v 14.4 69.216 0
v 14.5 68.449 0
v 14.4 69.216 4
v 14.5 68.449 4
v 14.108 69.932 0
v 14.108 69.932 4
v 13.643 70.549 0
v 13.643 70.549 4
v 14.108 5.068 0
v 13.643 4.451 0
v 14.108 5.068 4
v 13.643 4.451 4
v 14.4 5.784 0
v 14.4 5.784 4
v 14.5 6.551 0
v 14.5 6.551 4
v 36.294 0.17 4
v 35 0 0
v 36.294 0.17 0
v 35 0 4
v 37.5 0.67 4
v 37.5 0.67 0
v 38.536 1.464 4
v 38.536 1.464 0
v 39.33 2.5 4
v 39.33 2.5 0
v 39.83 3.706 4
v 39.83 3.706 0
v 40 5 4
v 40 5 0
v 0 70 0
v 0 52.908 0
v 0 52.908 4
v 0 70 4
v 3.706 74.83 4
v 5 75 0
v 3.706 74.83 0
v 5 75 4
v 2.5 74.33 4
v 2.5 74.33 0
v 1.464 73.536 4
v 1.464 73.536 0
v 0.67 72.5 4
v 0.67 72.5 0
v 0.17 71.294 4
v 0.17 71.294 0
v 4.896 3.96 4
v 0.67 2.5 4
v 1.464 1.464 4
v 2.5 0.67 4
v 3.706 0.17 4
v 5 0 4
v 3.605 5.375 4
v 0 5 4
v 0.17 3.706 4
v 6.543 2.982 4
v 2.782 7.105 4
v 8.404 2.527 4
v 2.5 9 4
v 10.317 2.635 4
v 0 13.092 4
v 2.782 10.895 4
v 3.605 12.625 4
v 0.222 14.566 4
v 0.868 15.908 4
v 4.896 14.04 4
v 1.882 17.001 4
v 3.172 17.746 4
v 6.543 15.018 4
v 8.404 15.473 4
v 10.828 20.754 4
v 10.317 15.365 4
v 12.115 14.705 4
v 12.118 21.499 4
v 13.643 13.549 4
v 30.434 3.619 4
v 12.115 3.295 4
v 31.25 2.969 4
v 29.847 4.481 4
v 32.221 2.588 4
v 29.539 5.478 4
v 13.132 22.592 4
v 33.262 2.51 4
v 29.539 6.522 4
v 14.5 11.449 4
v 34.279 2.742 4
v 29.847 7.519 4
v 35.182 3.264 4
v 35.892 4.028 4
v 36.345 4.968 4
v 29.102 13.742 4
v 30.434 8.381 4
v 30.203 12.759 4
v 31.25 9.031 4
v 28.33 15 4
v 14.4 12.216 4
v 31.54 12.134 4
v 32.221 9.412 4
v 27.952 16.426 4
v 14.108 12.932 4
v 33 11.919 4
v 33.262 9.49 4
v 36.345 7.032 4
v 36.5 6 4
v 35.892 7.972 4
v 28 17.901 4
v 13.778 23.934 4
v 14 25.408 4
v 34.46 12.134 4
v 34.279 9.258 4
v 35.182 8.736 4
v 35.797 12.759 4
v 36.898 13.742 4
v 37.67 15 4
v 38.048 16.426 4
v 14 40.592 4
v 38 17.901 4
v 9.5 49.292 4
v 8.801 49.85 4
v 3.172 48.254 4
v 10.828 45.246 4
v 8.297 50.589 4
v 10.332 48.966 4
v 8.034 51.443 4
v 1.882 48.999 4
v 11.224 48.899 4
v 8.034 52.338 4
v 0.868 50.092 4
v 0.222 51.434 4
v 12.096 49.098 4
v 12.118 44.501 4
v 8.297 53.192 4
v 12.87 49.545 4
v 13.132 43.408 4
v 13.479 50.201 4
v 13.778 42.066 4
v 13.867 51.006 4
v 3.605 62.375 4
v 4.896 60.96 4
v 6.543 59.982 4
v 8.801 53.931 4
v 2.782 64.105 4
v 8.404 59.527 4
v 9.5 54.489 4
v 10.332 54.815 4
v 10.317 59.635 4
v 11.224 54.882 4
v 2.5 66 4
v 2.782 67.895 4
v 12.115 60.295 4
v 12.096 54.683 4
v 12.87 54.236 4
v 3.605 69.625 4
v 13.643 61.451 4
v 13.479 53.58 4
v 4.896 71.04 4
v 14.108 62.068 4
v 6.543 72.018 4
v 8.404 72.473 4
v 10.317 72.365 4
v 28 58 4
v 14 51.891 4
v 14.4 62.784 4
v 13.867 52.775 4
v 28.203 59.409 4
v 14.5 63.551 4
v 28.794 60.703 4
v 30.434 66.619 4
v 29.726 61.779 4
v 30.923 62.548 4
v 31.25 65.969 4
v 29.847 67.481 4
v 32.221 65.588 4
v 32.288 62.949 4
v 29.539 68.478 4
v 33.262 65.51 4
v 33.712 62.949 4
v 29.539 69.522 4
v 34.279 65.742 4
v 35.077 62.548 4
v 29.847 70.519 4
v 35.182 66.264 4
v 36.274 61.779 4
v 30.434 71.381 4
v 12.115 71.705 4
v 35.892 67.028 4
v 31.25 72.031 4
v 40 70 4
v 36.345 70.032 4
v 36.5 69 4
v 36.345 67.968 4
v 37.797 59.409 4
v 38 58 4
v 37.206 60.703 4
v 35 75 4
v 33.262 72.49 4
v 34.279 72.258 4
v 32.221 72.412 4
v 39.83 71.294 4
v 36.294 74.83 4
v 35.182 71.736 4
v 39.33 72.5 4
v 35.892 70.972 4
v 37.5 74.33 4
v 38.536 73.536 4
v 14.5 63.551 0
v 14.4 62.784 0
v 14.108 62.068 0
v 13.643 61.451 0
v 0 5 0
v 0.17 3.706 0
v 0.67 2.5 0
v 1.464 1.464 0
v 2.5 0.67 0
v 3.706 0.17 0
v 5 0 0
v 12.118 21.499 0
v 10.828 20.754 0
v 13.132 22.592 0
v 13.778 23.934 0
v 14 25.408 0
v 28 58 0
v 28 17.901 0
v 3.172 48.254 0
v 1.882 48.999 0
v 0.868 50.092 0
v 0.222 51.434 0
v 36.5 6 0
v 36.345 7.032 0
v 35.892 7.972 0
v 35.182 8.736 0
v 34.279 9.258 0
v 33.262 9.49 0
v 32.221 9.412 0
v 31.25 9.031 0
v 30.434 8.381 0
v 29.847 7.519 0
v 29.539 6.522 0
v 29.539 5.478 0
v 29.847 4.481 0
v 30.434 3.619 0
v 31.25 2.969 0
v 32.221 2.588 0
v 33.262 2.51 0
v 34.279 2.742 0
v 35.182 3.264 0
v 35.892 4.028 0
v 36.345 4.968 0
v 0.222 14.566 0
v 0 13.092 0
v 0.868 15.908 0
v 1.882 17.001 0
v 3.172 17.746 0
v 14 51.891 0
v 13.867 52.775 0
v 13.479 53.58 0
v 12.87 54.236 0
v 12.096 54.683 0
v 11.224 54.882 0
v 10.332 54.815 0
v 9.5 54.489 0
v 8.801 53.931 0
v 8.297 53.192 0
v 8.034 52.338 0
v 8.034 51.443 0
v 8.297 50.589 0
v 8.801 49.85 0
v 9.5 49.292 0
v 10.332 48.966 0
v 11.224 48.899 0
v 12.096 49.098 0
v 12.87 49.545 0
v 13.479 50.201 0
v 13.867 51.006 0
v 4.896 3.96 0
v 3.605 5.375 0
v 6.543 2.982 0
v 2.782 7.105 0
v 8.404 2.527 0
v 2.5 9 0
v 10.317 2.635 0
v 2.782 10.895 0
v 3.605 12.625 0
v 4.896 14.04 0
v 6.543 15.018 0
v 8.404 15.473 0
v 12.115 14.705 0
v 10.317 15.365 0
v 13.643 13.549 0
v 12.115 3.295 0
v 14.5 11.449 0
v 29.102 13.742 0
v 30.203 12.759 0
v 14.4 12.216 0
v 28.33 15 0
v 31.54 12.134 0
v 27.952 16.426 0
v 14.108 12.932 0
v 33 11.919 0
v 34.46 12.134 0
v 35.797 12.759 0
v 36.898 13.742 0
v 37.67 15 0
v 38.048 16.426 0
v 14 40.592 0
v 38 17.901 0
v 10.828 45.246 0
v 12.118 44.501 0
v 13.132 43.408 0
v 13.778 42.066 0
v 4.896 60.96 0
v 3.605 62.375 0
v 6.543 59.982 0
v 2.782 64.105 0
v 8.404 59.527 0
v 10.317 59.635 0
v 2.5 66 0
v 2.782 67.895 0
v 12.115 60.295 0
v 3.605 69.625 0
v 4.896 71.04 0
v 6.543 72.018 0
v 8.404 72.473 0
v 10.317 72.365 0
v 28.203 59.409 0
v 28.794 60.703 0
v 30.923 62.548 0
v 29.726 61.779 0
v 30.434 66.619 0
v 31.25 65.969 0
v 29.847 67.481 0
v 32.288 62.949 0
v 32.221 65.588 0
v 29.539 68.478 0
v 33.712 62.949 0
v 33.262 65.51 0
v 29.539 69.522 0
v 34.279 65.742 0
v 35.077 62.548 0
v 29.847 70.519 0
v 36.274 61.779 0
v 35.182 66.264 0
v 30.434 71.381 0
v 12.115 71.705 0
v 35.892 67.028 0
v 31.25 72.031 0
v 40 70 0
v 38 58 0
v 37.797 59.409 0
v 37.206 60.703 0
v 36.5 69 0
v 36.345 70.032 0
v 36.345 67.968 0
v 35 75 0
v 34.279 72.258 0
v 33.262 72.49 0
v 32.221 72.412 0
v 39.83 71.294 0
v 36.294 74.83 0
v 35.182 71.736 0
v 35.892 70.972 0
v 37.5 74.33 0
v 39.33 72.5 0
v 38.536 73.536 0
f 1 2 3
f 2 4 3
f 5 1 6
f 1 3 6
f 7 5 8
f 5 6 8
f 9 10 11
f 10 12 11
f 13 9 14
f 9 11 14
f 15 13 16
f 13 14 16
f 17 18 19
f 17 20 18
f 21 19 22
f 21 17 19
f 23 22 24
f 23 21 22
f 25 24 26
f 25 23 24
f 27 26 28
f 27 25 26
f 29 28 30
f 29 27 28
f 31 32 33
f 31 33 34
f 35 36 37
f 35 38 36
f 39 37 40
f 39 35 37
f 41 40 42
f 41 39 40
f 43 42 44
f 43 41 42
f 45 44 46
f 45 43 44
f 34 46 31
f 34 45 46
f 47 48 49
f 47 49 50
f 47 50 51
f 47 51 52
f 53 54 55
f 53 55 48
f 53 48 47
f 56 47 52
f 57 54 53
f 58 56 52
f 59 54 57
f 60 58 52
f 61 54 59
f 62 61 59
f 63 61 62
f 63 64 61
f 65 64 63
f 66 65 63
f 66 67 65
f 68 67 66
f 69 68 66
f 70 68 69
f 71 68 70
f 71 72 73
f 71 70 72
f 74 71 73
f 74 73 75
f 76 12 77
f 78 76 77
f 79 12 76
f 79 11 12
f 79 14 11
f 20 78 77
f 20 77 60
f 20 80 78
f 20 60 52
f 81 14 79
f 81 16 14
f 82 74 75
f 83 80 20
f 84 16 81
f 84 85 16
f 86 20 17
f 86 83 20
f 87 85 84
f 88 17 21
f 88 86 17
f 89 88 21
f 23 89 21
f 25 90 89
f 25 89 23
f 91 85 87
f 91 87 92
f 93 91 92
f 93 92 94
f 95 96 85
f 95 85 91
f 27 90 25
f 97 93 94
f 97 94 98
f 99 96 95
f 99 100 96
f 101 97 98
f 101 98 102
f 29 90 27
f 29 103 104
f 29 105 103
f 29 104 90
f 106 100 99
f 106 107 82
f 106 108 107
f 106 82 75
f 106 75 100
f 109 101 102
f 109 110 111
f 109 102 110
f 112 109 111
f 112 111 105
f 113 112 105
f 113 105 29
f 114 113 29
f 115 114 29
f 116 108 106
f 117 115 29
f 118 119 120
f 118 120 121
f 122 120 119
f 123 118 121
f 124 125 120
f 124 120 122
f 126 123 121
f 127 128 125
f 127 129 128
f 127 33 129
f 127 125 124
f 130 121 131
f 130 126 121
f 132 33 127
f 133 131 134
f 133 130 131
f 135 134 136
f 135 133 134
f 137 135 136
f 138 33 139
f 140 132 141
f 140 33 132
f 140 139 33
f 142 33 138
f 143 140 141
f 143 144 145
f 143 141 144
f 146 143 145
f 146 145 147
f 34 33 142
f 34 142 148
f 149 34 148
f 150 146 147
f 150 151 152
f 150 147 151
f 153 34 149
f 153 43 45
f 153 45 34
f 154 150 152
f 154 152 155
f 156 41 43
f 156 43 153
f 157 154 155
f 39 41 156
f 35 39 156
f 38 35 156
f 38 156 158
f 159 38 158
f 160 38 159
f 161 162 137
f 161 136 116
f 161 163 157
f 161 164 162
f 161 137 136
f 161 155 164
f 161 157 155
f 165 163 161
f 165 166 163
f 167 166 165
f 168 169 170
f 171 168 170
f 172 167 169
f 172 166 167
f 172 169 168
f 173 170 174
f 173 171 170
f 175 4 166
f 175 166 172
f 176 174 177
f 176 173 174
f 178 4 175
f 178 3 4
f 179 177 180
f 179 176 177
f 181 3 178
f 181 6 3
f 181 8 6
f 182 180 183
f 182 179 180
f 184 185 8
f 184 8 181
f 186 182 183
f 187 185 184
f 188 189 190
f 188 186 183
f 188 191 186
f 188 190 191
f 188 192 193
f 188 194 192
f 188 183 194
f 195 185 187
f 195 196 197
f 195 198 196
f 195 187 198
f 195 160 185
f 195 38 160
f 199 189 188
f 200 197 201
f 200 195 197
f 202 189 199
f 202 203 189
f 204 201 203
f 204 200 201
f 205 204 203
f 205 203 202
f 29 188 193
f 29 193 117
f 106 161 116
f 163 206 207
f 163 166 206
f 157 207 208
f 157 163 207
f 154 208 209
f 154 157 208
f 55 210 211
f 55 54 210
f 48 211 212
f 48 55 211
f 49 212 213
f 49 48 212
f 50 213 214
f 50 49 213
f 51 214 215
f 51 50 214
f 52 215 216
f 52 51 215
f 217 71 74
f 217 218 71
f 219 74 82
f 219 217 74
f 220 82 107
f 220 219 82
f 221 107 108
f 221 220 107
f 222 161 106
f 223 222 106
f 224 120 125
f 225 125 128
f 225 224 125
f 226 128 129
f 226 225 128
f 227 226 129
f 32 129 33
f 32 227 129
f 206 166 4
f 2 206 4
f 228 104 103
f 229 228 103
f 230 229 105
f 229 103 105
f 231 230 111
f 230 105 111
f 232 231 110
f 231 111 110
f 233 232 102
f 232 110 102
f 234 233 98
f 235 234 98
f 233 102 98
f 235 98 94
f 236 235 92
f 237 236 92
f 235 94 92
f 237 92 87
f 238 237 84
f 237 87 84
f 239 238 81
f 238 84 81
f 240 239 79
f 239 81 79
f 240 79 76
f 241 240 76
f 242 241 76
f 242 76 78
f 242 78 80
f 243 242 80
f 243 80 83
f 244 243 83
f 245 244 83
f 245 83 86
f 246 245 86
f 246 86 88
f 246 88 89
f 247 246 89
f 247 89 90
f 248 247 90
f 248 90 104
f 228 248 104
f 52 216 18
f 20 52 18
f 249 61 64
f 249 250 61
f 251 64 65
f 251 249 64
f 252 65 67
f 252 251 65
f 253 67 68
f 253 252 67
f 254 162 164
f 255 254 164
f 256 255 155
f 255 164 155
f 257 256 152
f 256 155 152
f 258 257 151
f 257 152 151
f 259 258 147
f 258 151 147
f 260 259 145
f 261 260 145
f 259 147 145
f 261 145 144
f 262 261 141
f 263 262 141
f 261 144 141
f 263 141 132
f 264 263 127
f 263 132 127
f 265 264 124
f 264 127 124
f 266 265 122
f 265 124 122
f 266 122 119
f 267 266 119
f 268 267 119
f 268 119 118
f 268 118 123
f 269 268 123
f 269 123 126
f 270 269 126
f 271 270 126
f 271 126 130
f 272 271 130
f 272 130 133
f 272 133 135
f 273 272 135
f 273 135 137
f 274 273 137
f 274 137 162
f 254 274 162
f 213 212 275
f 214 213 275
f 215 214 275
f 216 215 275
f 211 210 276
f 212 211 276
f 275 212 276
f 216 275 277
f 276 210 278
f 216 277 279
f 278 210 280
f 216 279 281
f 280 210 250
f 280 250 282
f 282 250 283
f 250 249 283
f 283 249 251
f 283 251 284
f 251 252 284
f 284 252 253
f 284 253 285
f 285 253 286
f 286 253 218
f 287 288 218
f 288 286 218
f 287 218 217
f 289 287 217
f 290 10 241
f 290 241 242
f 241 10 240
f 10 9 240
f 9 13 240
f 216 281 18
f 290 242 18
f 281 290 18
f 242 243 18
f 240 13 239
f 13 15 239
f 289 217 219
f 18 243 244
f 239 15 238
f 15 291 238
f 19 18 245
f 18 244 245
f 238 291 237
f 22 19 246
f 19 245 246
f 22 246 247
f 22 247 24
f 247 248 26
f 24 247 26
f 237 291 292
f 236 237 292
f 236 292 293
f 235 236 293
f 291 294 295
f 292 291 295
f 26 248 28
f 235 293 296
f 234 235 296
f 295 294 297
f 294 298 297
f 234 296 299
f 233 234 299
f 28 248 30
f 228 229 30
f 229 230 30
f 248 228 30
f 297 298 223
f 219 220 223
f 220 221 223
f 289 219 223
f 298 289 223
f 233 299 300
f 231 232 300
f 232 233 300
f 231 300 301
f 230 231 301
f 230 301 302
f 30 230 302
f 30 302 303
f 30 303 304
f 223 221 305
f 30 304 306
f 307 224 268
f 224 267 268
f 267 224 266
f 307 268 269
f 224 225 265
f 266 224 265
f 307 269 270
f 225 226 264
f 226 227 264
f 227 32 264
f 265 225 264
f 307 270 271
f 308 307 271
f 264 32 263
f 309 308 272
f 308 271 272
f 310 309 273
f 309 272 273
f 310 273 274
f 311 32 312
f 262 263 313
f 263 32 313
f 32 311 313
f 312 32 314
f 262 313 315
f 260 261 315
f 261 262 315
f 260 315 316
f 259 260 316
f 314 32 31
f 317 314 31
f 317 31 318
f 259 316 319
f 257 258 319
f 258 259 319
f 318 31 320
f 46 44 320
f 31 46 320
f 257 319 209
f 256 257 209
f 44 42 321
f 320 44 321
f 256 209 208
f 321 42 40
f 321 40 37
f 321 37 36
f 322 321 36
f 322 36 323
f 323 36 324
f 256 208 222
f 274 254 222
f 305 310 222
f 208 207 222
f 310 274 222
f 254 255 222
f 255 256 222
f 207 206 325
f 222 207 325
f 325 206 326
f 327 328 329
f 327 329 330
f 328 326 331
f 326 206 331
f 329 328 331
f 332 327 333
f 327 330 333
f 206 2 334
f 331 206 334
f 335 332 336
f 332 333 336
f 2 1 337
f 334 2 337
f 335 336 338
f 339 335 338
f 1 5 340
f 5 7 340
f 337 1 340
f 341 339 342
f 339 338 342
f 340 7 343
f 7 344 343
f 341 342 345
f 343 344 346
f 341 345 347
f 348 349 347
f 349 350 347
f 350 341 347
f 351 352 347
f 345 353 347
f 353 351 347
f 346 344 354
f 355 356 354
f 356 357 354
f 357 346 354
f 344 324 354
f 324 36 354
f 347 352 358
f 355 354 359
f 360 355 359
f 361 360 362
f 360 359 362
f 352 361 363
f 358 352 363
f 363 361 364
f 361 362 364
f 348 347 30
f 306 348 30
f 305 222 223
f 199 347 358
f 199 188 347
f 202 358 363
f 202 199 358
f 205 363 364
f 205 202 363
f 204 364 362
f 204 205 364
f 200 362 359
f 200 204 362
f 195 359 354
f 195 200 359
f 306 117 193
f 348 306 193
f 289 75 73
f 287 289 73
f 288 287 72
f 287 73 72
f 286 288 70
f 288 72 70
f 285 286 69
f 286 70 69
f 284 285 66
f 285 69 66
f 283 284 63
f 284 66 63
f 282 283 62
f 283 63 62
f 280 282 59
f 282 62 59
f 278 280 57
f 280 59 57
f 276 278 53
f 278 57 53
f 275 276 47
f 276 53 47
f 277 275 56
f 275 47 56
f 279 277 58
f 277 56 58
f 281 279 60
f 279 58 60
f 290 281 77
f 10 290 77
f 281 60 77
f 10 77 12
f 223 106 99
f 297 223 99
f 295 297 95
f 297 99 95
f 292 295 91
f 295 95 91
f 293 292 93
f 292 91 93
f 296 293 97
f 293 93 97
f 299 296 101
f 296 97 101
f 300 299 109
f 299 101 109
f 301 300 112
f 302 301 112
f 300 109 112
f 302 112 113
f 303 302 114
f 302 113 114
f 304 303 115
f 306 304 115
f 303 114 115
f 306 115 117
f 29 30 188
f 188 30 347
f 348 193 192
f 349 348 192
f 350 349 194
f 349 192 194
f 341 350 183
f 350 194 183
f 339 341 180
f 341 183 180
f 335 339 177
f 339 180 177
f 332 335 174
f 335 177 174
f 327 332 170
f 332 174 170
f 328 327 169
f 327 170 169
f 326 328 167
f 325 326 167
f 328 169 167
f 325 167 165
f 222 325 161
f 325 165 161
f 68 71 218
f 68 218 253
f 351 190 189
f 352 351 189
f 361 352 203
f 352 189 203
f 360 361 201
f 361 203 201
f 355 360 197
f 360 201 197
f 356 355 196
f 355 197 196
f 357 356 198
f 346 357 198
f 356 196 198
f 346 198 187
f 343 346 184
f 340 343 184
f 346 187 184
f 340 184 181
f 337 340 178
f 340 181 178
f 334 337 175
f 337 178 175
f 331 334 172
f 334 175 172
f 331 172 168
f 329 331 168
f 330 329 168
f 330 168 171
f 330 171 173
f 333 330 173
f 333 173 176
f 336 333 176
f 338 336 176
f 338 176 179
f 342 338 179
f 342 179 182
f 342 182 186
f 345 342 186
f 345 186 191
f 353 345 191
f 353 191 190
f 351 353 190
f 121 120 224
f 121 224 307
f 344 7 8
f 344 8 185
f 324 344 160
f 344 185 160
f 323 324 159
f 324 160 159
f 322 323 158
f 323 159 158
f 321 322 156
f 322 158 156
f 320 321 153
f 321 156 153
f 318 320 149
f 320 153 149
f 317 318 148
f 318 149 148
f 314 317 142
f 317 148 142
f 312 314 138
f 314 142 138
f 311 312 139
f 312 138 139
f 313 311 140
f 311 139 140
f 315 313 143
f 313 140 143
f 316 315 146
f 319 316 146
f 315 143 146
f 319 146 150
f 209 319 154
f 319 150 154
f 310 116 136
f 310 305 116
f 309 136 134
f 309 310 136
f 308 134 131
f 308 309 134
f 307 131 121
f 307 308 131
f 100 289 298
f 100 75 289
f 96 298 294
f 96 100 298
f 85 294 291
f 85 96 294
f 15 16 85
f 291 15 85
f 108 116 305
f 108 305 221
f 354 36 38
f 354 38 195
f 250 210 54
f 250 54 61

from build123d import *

# Parameters (mm, degrees)
ESQUISSE1_W                  = 40
ESQUISSE1_H                  = 75
BOSS_EXTRU_1_DEPTH           = 4
ENL_V_MAT_EXTRU_1_DEPTH      = 5
ESQUISSE3_R                  = 6.5
ESQUISSE3_R_2                = 3
ENL_V_MAT_EXTRU_2_DEPTH      = 5
CONG_1_R                     = 5
ESQUISSE4_R                  = 3.5
ENL_V_MAT_EXTRU_3_DEPTH      = 5
ENL_V_MAT_EXTRU_4_DEPTH      = 1
ENL_V_MAT_EXTRU_4_DEPTH_BACK = 5
ESQUISSE6_W                  = 3.826832881
ESQUISSE6_H                  = 13.310723064
ESQUISSE6_H_2                = 14.142643256
BOSS_EXTRU_2_DEPTH           = 4
CONG_2_R                     = 3


with BuildPart() as part:
    # Esquisse1 → Boss.-Extru.1 (new body)
    with BuildSketch(Plane.XY):
        with Locations((20, 37.5)):
            Rectangle(ESQUISSE1_W, ESQUISSE1_H)
    extrude(amount=BOSS_EXTRU_1_DEPTH)

    # Esquisse2 → Enlèv. mat.-Extru.1 (cut, through all)
    with BuildSketch(Plane.XY.offset(4)):
        Polygon((0, 16.5), (0, 49.5), (14, 44), (14, 22), align=None)
    extrude(amount=-ENL_V_MAT_EXTRU_1_DEPTH, mode=Mode.SUBTRACT)

    # Esquisse3 → Enlèv. mat.-Extru.2 (cut, through all)
    with BuildSketch(Plane.XY.offset(4)):
        with Locations((9, 66)):
            Circle(ESQUISSE3_R)
        with Locations((9, 9)):
            Circle(ESQUISSE3_R)
        with Locations((11, 51.890523543)):
            Circle(ESQUISSE3_R_2)
    extrude(amount=-ENL_V_MAT_EXTRU_2_DEPTH, mode=Mode.SUBTRACT)

    # Congé1
    cong_1_edges = [part.edges().sort_by_distance(p)[0] for p in [
        (0, 16.5, 2),
        (0, 49.5, 2),
        (14, 44, 2),
        (14, 22, 2),
        (0, 75, 2),
        (40, 75, 2),
        (40, 0, 2),
        (0, 0, 2),
    ]]
    fillet(cong_1_edges, radius=CONG_1_R)

    # Esquisse4 → Enlèv. mat.-Extru.3 (cut, through all)
    with BuildSketch(Plane.XY.offset(4)):
        with Locations((33, 69)):
            Circle(ESQUISSE4_R)
        with Locations((33, 6)):
            Circle(ESQUISSE4_R)
    extrude(amount=-ENL_V_MAT_EXTRU_3_DEPTH, mode=Mode.SUBTRACT)

    # Esquisse5 → Enlèv. mat.-Extru.4 (cut, two sides)
    with BuildSketch(Plane.XY.offset(4)) as enl_v_mat_extru_4_sk:
        with BuildLine():
            Line((28, 58), (28, 17.901446768))
            ThreePointArc((28, 17.901446768), (33, 11.919389183), (38, 17.901446768))
            Line((38, 17.901446768), (38, 58))
            ThreePointArc((38, 58), (33, 63), (28, 58))
        make_face()
    extrude(amount=ENL_V_MAT_EXTRU_4_DEPTH, mode=Mode.SUBTRACT)
    extrude(enl_v_mat_extru_4_sk.sketch, amount=-ENL_V_MAT_EXTRU_4_DEPTH_BACK, mode=Mode.SUBTRACT)

    # Esquisse6 → Boss.-Extru.2 (add)
    with BuildSketch(Plane.XY.offset(4)):
        with Locations((16.413416441, 65.03655834)):
            Rectangle(ESQUISSE6_W, ESQUISSE6_H)
        with Locations((16.413416441, 9.381097526)):
            Rectangle(ESQUISSE6_W, ESQUISSE6_H_2)
    extrude(amount=-BOSS_EXTRU_2_DEPTH)

    # Congé2
    cong_2_edges = [part.edges().sort_by_distance(p)[0] for p in [
        (14.5, 69.464101615, 2),
        (14.5, 62.535898385, 2),
        (14.5, 12.464101615, 2),
        (14.5, 5.535898385, 2),
    ]]
    fillet(cong_2_edges, radius=CONG_2_R)


solid = part.part
